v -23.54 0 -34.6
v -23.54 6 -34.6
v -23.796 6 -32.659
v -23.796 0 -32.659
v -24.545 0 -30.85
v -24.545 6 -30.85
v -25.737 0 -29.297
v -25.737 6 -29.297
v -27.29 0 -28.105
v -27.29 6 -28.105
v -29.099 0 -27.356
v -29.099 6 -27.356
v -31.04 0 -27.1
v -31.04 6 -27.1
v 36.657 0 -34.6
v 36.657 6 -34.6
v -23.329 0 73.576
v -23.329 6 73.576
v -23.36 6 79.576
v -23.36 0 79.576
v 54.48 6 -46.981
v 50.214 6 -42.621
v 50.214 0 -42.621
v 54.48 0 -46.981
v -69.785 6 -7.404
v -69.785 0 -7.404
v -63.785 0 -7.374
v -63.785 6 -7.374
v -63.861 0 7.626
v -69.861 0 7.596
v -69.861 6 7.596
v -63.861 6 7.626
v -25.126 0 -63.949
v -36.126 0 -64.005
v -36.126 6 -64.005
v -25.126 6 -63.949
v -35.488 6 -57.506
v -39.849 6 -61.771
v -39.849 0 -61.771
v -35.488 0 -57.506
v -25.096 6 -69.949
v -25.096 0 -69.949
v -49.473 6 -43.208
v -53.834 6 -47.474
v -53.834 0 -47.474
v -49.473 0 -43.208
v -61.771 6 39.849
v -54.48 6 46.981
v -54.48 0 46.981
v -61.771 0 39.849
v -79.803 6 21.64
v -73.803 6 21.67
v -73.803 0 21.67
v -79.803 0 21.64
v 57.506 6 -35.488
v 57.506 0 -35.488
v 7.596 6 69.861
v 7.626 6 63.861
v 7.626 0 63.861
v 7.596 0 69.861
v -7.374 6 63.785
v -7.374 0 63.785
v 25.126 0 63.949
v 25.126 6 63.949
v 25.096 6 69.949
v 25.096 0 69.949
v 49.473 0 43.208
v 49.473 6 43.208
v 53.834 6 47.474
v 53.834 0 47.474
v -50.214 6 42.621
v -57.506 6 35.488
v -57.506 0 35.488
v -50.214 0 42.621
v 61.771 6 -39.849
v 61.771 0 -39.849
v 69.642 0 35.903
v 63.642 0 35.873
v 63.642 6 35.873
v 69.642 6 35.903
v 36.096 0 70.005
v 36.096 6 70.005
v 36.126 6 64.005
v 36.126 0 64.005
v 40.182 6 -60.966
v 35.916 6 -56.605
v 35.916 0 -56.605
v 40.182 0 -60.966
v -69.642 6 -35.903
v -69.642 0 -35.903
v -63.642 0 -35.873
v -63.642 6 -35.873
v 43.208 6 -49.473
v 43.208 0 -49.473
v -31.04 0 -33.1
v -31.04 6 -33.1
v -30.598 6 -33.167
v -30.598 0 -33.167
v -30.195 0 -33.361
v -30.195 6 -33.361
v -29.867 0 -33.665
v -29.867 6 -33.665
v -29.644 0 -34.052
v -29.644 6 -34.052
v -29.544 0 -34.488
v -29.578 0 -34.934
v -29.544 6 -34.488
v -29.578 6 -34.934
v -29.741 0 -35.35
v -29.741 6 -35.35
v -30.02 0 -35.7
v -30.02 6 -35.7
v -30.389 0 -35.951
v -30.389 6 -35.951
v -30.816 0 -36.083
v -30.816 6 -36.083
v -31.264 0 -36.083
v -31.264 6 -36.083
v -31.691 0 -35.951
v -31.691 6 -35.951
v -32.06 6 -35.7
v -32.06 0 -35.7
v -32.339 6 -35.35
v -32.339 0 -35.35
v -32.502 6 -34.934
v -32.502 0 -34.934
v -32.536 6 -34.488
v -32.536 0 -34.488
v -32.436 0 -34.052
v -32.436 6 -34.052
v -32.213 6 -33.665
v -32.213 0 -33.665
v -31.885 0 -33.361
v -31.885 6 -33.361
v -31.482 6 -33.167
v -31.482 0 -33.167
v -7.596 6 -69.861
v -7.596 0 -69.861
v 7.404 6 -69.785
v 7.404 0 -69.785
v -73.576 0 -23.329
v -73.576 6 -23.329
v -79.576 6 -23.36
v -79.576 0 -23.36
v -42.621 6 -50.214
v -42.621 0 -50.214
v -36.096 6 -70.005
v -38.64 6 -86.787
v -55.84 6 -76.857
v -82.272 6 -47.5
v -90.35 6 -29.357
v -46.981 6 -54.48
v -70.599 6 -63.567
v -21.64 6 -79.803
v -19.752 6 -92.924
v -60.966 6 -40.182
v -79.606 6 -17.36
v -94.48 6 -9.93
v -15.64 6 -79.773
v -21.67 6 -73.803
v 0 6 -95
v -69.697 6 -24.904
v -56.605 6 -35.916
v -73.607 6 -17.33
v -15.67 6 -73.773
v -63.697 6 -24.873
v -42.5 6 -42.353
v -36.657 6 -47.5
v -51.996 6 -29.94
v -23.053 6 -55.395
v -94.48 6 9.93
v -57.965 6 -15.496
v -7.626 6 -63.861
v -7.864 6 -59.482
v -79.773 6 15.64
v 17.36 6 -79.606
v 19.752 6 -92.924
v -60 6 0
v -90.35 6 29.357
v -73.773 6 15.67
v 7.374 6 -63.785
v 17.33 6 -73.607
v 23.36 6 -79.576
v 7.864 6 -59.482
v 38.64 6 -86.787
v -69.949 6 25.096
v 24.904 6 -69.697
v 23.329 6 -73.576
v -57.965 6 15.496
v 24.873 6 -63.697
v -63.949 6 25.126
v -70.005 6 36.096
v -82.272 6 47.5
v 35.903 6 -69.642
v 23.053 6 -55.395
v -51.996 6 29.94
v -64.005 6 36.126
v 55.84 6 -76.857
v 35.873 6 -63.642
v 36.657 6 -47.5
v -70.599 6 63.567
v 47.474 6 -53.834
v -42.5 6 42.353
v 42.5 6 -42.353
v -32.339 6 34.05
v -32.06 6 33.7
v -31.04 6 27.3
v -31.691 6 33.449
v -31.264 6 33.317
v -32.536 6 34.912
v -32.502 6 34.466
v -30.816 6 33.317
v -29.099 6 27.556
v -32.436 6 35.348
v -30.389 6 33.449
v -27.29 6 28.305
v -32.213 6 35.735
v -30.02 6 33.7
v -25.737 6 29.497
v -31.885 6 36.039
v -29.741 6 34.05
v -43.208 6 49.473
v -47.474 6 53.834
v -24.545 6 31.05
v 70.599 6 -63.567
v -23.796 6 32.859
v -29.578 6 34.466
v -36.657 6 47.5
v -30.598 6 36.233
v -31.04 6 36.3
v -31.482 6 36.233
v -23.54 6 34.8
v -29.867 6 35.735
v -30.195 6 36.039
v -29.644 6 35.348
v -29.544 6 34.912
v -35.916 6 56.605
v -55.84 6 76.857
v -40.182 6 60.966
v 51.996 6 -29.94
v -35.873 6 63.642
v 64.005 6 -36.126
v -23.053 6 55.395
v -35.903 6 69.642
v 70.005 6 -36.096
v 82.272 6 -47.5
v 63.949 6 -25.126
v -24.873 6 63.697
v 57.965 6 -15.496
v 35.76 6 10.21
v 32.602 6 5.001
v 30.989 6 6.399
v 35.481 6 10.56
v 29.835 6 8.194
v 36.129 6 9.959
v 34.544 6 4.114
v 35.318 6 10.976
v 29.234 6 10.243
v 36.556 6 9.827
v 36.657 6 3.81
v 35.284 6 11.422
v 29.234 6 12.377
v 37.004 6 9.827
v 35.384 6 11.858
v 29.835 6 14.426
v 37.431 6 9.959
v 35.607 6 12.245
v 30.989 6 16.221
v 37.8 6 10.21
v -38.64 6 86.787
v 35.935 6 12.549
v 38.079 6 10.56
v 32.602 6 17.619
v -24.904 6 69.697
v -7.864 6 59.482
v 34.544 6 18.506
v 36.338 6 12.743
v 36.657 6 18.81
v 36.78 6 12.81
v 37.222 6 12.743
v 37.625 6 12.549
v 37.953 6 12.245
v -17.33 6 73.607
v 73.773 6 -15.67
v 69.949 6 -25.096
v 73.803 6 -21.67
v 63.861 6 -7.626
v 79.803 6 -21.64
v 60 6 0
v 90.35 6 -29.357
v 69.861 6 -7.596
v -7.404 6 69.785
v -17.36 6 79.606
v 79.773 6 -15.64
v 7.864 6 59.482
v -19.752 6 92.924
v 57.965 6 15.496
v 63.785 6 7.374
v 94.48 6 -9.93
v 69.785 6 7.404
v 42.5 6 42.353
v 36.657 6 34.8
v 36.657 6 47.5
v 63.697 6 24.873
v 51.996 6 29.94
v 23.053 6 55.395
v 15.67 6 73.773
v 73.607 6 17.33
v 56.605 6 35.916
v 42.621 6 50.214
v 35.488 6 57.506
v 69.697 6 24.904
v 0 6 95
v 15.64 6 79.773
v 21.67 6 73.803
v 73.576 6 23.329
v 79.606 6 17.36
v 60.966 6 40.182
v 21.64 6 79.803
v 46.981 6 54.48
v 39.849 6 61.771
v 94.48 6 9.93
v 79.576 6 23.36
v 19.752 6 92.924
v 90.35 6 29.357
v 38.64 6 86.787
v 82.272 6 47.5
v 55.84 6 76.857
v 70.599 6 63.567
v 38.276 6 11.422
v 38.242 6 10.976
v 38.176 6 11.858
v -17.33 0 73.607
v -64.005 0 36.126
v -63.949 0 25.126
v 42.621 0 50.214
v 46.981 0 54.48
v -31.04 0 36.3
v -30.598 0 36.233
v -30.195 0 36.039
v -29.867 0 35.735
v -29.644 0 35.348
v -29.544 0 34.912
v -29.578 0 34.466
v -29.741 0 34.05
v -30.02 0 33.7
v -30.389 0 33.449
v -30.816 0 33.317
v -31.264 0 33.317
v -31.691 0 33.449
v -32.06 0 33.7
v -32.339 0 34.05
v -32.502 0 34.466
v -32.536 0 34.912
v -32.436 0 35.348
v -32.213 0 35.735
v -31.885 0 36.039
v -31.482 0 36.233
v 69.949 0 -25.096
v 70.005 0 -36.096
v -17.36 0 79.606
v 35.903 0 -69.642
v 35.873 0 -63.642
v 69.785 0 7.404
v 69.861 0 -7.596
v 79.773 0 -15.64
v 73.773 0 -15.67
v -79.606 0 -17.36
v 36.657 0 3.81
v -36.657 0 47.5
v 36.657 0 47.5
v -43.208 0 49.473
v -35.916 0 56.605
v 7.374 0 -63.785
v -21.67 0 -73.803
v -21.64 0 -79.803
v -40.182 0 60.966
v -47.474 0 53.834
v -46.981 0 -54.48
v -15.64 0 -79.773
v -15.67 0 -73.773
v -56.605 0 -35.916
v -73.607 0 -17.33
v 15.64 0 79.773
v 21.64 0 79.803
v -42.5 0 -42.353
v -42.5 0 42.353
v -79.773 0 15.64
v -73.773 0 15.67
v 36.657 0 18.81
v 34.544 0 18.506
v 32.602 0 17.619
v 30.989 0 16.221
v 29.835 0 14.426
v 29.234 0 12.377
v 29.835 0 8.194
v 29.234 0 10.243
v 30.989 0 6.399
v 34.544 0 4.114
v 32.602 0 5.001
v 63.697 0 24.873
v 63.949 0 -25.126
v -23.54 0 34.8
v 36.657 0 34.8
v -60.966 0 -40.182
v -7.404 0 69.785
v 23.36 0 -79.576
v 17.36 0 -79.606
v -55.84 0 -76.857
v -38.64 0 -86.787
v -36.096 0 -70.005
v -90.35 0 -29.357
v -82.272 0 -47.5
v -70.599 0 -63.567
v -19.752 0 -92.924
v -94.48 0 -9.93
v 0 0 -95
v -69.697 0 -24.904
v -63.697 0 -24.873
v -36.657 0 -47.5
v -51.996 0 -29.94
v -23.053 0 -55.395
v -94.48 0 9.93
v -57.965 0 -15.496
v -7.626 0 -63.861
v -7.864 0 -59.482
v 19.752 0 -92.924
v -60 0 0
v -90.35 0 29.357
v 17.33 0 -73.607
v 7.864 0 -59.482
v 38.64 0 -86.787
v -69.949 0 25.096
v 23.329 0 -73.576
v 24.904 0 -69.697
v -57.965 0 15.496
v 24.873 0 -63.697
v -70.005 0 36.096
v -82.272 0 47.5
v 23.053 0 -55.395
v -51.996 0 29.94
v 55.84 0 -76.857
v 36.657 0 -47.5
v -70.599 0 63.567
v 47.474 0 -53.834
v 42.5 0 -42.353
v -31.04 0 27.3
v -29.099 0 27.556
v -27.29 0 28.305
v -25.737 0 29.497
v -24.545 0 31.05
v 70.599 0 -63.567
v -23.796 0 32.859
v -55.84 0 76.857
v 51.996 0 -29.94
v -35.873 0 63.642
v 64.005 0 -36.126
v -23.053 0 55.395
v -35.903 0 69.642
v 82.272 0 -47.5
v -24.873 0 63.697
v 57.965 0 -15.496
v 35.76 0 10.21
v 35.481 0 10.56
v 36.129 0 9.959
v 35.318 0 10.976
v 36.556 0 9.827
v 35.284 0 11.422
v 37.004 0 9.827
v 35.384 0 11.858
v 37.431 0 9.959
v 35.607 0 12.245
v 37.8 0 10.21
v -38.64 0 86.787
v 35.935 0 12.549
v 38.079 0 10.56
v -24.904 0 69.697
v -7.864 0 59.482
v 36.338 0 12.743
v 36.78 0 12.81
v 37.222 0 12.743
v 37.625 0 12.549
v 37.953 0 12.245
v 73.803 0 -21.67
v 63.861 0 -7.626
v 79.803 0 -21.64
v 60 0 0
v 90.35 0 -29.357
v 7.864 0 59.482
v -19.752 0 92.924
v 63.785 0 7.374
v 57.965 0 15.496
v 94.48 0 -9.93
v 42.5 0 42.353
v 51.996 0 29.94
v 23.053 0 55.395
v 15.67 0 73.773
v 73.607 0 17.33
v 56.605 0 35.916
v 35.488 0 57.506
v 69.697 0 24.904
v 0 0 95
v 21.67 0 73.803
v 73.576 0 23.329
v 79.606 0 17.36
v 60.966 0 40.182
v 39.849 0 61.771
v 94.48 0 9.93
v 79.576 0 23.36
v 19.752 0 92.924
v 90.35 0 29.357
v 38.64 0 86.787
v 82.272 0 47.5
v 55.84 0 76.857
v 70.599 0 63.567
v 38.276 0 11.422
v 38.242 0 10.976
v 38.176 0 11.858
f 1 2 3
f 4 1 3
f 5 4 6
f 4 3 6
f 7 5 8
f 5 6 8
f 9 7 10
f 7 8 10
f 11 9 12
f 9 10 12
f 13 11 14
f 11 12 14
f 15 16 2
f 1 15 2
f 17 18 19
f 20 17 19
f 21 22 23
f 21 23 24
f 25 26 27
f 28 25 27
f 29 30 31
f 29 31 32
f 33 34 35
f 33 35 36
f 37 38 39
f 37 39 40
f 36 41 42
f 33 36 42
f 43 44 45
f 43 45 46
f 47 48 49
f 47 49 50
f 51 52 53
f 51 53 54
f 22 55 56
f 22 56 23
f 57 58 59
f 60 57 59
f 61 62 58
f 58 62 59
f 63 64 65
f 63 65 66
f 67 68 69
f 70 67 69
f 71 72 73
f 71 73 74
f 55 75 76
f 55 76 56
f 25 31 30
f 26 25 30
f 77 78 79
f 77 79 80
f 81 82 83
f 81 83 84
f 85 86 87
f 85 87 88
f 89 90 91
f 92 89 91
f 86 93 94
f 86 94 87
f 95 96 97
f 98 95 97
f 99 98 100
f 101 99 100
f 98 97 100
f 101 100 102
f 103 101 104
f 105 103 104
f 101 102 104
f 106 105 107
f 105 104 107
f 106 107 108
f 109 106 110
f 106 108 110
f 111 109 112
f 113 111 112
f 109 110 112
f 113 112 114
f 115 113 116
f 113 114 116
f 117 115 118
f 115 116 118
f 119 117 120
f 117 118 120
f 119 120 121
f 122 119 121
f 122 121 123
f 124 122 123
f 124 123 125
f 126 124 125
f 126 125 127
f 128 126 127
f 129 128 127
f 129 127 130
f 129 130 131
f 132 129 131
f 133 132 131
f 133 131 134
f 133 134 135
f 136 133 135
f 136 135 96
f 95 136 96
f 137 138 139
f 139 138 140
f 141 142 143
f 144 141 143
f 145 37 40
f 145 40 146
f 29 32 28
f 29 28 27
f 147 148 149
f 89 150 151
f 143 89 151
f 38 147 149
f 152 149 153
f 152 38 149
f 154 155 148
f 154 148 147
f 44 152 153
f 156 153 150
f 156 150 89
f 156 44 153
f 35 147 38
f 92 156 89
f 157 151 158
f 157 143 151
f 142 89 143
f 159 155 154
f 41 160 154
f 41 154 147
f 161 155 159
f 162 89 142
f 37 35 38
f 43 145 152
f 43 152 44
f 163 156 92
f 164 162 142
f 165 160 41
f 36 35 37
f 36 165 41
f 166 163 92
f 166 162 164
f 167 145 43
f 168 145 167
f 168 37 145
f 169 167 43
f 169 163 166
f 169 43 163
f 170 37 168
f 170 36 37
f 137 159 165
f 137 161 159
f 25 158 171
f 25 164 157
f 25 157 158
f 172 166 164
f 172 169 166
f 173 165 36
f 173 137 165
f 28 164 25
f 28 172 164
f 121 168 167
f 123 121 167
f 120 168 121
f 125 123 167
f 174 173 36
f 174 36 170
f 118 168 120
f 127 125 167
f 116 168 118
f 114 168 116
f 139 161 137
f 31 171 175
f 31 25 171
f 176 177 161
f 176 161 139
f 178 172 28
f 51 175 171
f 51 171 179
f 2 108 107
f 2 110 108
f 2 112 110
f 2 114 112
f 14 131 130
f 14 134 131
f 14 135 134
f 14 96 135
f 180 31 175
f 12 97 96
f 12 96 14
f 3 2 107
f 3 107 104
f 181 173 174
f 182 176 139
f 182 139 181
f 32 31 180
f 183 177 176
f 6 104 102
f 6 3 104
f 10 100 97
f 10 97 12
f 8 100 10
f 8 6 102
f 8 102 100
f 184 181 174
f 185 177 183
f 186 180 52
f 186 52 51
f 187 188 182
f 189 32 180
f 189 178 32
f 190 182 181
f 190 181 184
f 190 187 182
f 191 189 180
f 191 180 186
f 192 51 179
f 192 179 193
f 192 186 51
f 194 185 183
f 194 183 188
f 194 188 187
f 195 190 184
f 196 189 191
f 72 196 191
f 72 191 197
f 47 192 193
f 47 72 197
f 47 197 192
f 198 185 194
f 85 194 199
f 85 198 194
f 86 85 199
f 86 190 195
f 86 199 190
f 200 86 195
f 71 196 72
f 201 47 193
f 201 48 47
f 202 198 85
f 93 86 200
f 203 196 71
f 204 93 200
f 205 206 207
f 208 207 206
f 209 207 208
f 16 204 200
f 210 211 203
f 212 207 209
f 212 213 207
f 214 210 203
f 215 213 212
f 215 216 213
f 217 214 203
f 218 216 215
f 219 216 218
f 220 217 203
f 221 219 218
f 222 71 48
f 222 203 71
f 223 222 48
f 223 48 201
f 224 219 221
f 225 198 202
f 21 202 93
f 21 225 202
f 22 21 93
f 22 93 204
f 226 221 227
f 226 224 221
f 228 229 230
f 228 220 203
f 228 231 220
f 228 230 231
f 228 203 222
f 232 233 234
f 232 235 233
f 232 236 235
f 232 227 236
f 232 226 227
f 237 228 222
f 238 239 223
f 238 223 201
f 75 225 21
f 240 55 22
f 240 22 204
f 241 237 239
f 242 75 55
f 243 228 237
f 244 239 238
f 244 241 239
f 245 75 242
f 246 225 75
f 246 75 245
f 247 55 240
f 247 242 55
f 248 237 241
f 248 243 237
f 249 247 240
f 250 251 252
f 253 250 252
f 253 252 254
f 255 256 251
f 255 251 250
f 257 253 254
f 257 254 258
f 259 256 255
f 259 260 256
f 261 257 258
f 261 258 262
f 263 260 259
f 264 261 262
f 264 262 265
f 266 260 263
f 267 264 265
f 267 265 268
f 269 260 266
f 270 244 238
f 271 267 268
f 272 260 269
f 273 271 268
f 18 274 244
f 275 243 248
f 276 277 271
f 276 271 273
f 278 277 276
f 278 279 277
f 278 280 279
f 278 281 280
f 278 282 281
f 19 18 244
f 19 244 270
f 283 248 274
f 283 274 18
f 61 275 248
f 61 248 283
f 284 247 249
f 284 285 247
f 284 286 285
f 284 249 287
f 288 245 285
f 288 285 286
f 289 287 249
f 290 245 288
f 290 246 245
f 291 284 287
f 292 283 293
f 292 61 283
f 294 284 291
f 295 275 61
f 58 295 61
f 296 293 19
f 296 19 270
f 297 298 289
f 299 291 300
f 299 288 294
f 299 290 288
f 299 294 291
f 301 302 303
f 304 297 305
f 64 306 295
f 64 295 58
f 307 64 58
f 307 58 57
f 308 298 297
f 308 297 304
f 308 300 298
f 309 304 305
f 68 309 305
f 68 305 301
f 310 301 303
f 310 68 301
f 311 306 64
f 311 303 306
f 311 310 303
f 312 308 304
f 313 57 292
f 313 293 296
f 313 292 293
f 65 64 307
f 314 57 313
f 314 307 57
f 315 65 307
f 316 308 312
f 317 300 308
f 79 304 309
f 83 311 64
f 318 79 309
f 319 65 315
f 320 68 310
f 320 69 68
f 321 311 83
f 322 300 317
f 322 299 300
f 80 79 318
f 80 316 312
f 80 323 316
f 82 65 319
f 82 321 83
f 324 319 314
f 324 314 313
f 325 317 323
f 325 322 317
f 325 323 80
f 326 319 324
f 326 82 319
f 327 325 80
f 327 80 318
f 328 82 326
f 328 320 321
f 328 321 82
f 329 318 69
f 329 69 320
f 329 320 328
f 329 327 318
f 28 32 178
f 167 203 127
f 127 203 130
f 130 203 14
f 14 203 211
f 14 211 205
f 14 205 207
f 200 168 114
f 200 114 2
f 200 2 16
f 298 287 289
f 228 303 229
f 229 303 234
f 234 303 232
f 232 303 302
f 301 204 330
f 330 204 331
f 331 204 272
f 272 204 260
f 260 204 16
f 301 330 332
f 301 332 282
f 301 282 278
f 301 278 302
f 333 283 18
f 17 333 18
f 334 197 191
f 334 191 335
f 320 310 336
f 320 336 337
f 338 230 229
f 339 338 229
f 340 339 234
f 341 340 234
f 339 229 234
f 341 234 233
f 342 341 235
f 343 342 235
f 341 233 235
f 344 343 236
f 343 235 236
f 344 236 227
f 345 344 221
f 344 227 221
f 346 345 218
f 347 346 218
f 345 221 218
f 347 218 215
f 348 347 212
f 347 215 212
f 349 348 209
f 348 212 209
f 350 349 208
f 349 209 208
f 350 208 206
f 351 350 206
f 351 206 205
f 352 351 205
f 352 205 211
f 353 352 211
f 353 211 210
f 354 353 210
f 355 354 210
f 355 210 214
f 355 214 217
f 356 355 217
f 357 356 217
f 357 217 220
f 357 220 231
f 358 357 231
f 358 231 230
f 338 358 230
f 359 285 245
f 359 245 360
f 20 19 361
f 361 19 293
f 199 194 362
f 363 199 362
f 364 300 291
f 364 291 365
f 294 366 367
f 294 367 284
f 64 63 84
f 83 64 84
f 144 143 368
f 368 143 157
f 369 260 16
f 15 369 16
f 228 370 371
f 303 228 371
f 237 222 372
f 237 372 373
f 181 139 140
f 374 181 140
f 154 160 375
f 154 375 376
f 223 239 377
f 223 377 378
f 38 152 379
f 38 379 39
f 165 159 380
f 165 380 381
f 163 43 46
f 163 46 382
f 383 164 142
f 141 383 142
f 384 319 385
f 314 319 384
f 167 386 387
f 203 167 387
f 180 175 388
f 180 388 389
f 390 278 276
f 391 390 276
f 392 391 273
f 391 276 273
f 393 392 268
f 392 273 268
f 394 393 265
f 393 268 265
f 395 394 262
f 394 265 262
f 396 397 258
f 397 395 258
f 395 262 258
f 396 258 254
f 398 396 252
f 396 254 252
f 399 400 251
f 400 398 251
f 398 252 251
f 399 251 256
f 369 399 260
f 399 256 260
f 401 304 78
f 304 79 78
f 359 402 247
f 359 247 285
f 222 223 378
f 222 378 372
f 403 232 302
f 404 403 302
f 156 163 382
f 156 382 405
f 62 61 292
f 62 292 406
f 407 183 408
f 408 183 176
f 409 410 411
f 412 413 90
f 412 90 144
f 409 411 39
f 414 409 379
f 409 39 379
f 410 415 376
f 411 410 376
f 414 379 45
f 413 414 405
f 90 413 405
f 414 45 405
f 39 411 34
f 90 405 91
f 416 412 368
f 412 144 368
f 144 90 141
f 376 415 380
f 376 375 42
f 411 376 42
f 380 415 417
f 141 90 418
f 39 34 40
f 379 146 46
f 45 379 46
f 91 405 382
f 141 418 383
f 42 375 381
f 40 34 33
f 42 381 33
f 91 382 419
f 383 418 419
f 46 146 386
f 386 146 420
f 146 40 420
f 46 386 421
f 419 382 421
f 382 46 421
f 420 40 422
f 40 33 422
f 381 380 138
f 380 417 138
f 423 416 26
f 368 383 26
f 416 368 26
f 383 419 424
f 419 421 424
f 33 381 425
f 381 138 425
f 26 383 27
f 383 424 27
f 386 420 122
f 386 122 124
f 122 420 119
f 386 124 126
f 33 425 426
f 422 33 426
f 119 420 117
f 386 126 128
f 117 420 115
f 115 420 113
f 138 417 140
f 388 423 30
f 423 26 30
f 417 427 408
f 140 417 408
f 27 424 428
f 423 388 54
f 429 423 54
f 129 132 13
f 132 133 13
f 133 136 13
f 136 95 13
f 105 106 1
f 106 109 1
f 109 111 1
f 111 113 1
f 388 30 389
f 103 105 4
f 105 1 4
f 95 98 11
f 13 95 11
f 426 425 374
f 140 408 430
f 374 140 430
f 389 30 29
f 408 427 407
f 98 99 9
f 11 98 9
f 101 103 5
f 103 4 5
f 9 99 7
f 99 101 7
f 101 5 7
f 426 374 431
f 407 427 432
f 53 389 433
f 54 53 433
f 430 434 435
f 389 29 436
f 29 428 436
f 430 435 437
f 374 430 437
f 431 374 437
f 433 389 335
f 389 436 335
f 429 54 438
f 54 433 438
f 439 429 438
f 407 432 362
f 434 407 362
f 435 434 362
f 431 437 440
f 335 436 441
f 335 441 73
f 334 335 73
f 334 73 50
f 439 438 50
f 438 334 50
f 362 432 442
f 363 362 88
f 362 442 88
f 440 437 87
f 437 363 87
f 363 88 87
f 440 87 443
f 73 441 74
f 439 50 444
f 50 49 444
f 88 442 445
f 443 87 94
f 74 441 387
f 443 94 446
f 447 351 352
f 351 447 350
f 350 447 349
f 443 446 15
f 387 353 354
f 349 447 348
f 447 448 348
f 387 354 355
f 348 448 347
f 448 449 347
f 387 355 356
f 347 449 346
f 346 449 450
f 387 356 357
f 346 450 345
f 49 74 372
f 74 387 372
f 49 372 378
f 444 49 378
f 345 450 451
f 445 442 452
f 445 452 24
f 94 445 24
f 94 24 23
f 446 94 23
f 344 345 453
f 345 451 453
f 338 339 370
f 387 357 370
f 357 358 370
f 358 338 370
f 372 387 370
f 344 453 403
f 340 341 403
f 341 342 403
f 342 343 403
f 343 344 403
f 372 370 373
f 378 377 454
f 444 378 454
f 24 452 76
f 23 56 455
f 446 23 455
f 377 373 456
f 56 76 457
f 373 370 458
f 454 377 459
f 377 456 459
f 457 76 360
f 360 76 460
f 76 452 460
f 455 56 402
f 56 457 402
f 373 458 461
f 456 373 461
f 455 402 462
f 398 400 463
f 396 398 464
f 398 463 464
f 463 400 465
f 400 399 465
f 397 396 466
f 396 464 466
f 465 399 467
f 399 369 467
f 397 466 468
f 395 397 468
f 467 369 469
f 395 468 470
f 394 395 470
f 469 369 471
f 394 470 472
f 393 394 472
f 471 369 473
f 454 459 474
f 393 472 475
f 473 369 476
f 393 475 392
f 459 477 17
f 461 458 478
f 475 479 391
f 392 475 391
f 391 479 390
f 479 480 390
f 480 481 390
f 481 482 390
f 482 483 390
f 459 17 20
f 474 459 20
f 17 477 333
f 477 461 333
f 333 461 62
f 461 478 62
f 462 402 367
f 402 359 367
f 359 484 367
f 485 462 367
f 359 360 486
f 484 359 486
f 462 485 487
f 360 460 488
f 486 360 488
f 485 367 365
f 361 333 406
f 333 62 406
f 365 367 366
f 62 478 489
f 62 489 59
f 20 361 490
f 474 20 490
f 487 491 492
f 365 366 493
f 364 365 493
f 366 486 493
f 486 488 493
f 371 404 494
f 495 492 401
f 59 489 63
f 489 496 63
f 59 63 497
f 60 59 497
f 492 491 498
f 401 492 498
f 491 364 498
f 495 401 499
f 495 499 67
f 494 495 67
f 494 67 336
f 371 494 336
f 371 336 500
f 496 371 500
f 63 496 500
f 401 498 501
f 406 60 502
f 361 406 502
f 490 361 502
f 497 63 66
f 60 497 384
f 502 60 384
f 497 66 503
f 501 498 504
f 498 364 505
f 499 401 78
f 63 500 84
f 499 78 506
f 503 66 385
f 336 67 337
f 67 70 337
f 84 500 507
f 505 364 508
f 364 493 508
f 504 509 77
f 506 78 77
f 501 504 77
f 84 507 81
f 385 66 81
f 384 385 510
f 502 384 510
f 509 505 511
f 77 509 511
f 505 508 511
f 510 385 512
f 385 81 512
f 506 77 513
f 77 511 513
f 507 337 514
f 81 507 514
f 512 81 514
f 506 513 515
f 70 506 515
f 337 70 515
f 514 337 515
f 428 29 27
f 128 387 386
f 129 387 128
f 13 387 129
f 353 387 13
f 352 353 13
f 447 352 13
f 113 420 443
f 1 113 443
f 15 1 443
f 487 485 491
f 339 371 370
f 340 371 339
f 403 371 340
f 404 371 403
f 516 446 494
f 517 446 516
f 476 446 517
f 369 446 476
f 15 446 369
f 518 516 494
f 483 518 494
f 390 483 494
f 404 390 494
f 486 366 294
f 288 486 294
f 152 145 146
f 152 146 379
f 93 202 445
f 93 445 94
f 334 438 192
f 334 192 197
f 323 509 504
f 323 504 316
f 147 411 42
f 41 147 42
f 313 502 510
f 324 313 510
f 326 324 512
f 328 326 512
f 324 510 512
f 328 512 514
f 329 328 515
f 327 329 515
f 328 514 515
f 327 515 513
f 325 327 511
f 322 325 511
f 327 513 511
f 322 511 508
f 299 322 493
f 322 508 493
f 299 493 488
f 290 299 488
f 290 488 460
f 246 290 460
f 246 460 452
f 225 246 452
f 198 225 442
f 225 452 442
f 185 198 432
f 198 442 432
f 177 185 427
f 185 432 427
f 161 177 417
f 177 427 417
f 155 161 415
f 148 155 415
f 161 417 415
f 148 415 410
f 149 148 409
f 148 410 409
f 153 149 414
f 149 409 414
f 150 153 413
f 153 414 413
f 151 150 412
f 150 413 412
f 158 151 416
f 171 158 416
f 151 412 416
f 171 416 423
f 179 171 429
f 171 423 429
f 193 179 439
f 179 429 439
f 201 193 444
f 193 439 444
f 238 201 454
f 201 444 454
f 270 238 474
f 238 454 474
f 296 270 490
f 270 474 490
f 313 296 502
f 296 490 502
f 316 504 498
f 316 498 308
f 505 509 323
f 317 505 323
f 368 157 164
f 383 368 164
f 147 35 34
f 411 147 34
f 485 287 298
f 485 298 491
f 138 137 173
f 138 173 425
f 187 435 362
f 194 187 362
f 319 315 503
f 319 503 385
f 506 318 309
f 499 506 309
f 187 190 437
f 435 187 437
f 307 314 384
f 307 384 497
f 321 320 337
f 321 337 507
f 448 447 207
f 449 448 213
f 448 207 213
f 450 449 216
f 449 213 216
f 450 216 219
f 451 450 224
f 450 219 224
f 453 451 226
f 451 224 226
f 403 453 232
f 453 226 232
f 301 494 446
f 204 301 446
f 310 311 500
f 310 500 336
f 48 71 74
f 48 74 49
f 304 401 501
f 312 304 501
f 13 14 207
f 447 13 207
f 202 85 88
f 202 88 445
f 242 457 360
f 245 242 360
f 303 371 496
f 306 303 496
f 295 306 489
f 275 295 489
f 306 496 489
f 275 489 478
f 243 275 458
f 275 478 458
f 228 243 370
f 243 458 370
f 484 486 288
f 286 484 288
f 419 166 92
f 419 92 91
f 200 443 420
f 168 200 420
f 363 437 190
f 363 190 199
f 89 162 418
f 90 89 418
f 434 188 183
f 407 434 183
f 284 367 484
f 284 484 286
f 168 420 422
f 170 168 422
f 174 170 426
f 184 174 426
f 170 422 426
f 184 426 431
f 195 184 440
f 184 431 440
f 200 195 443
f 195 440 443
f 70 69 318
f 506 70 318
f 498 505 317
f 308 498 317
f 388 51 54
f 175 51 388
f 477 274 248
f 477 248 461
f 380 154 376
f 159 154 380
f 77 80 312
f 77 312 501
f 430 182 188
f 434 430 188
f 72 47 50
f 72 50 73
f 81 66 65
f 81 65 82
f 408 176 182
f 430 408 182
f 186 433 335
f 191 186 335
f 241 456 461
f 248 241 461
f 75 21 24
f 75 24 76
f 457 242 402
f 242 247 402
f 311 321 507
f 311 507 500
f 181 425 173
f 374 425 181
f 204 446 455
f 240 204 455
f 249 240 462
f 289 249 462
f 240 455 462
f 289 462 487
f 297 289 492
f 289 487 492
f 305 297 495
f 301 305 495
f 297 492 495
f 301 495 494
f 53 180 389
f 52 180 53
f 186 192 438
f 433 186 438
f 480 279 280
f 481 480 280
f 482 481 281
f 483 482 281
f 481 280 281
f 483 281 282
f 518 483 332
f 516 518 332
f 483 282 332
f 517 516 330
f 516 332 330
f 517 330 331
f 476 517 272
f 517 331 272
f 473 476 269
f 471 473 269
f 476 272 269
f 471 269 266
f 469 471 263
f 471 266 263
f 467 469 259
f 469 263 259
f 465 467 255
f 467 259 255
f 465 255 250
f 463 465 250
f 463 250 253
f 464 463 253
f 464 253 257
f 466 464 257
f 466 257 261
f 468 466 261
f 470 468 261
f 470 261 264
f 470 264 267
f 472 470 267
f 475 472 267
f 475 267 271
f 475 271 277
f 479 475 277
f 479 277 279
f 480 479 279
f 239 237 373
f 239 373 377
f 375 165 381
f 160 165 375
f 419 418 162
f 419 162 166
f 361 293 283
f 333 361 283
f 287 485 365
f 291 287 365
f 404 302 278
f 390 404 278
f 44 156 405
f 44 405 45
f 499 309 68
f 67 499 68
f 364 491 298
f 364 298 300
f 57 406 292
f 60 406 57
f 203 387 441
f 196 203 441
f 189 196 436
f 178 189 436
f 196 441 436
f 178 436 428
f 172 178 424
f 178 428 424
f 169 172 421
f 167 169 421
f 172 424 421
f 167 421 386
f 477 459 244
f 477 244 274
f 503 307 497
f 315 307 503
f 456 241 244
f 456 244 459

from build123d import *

# Parameters (mm, degrees)
SKETCH1_R             = 95
BOSS_EXTRUDE1_DEPTH   = 6
SKETCH2_W             = 55
SKETCH2_H             = 30
CUT_EXTRUDE1_DEPTH    = 135.484199815
CAVITY1_START         = -69.821849164
CAVITY1_OUTLINE_W     = 15
CAVITY1_OUTLINE_H     = 6
CAVITY1_OUTLINE_W_2   = 11
CAVITY1_DEPTH         = 6
CAVITY1_START_2       = 63.821772898
CAVITY1_2_OUTLINE_W   = 11
CAVITY1_2_OUTLINE_H   = 6
CAVITY1_2_OUTLINE_W_2 = 15
CAVITY1_2_DEPTH       = 6
CAVITY1_START_3       = -7.051829773
CAVITY1_3_OUTLINE_W   = 6
CAVITY1_3_OUTLINE_H   = 6
CAVITY1_3_DEPTH       = 14.103659546
CAVITY1_START_4       = -35.551829773
CAVITY1_4_OUTLINE_W   = 6
CAVITY1_4_OUTLINE_H   = 6
CAVITY1_4_DEPTH       = 10.103659546
CAVITY1_START_5       = 25.448170227
CAVITY1_5_OUTLINE_W   = 6
CAVITY1_5_OUTLINE_H   = 6
CAVITY1_5_DEPTH       = 10.103659546
CAVITY1_START_6       = -36.448170227
CAVITY1_6_OUTLINE_W   = 6
CAVITY1_6_OUTLINE_H   = 6
CAVITY1_6_DEPTH       = 0.896340454
CAVITY1_START_7       = -25.448170227
CAVITY1_7_OUTLINE_W   = 6
CAVITY1_7_OUTLINE_H   = 6
CAVITY1_7_DEPTH       = 0.896340454
CAVITY1_START_8       = -7.948170227
CAVITY1_8_OUTLINE_W   = 6
CAVITY1_8_OUTLINE_H   = 6
CAVITY1_8_DEPTH       = 0.896340454
CAVITY1_START_9       = 7.051829773
CAVITY1_9_OUTLINE_W   = 6
CAVITY1_9_OUTLINE_H   = 6
CAVITY1_9_DEPTH       = 0.896340454
CAVITY1_START_10      = 24.551829773
CAVITY1_10_OUTLINE_W  = 6
CAVITY1_10_OUTLINE_H  = 6
CAVITY1_10_DEPTH      = 0.896340454
CAVITY1_START_11      = 35.551829773
CAVITY1_11_OUTLINE_W  = 6
CAVITY1_11_OUTLINE_H  = 6
CAVITY1_11_DEPTH      = 0.896340454
SKETCH3_R             = 1.5
CUT_EXTRUDE3_DEPTH    = 10
CUT_EXTRUDE4_DEPTH    = 135.484199815
CAVITY2_START         = 73.692998072
CAVITY2_OUTLINE_W     = 6
CAVITY2_OUTLINE_H     = 6
CAVITY2_DEPTH         = 6
CUT_EXTRUDE5_DEPTH    = 135.484199815


# Read off the part's stored shape, not the designer's step: Cavity1, Cavity2
with BuildPart() as part:
    # Sketch1 → Boss-Extrude1 (new body)
    with BuildSketch(Plane(origin=(0, 0, 0), x_dir=(1, 0, 0), z_dir=(0, 1, 0))):
        with Locations(Location((0, 0, 0), (0, 0, 270))):
            Circle(SKETCH1_R)
        with BuildLine():
            Line((-36.657195747, -47.5), (36.657195747, -47.5))
            ThreePointArc((36.657195747, -47.5), (0, -60), (-36.657195747, -47.5))
        make_face(mode=Mode.SUBTRACT)
        with BuildLine():
            Line((-42.5, 42.352685865), (-42.5, -42.352685865))
            ThreePointArc((-42.5, -42.352685865), (-60, 0), (-42.5, 42.352685865))
        make_face(mode=Mode.SUBTRACT)
        with BuildLine():
            Line((36.657195747, 47.5), (-36.657195747, 47.5))
            ThreePointArc((-36.657195747, 47.5), (0, 60), (36.657195747, 47.5))
        make_face(mode=Mode.SUBTRACT)
        with BuildLine():
            Line((42.5, -42.352685865), (42.5, 42.352685865))
            ThreePointArc((42.5, 42.352685865), (60, 0), (42.5, -42.352685865))
        make_face(mode=Mode.SUBTRACT)
    extrude(amount=BOSS_EXTRUDE1_DEPTH)

    # Sketch2 → Cut-Extrude1 (cut, through all)
    with BuildSketch(Plane(origin=(0, 6, 0), x_dir=(1, 0, 0), z_dir=(0, 1, 0))):
        Rectangle(SKETCH2_W, SKETCH2_H)
    extrude(amount=-CUT_EXTRUDE1_DEPTH, mode=Mode.SUBTRACT)

    # Cavity1 outline → Cavity1 (cut)
    with BuildSketch(Plane(origin=(0, 0, 0), x_dir=(0.9999872892756082, 0, 0.005041952719030872), z_dir=(0.005041952719030872, 0, -0.9999872892756083)).offset(CAVITY1_START)):
        with Locations((0.448170227, -3)):
            Rectangle(CAVITY1_OUTLINE_W, CAVITY1_OUTLINE_H)
        with Locations((30.948170227, -3)):
            Rectangle(CAVITY1_OUTLINE_W_2, CAVITY1_OUTLINE_H)
        with Locations((-30.051829773, -3)):
            Rectangle(CAVITY1_OUTLINE_W_2, CAVITY1_OUTLINE_H)
    extrude(amount=CAVITY1_DEPTH, mode=Mode.SUBTRACT)

    # Cavity1 2 outline → Cavity1 2 (cut)
    with BuildSketch(Plane(origin=(0, 0, 0), x_dir=(0.9999872892756082, 0, 0.005041952719030872), z_dir=(0.005041952719030872, 0, -0.9999872892756083)).offset(CAVITY1_START_2)):
        with Locations((30.051829773, -3)):
            Rectangle(CAVITY1_2_OUTLINE_W, CAVITY1_2_OUTLINE_H)
        with Locations((-0.448170227, -3)):
            Rectangle(CAVITY1_2_OUTLINE_W_2, CAVITY1_2_OUTLINE_H)
        with Locations((-30.948170227, -3)):
            Rectangle(CAVITY1_2_OUTLINE_W, CAVITY1_2_OUTLINE_H)
    extrude(amount=CAVITY1_2_DEPTH, mode=Mode.SUBTRACT)

    # Cavity1 3 outline → Cavity1 3 (cut)
    with BuildSketch(Plane(origin=(0, 0, 0), x_dir=(0.9999872892756082, 0, 0.005041952719030872), z_dir=(0.005041952719030872, 0, -0.9999872892756083)).offset(CAVITY1_START_3)):
        with Locations((66.821849164, -3)):
            Rectangle(CAVITY1_3_OUTLINE_W, CAVITY1_3_OUTLINE_H)
        with Locations((-66.821849164, -3)):
            Rectangle(CAVITY1_3_OUTLINE_W, CAVITY1_3_OUTLINE_H)
    extrude(amount=CAVITY1_3_DEPTH, mode=Mode.SUBTRACT)

    # Cavity1 4 outline → Cavity1 4 (cut)
    with BuildSketch(Plane(origin=(0, 0, 0), x_dir=(0.9999872892756082, 0, 0.005041952719030872), z_dir=(0.005041952719030872, 0, -0.9999872892756083)).offset(CAVITY1_START_4)):
        with Locations((66.821849164, -3)):
            Rectangle(CAVITY1_4_OUTLINE_W, CAVITY1_4_OUTLINE_H)
        with Locations((-66.821849164, -3)):
            Rectangle(CAVITY1_4_OUTLINE_W, CAVITY1_4_OUTLINE_H)
    extrude(amount=CAVITY1_4_DEPTH, mode=Mode.SUBTRACT)

    # Cavity1 5 outline → Cavity1 5 (cut)
    with BuildSketch(Plane(origin=(0, 0, 0), x_dir=(0.9999872892756082, 0, 0.005041952719030872), z_dir=(0.005041952719030872, 0, -0.9999872892756083)).offset(CAVITY1_START_5)):
        with Locations((66.821849164, -3)):
            Rectangle(CAVITY1_5_OUTLINE_W, CAVITY1_5_OUTLINE_H)
        with Locations((-66.821849164, -3)):
            Rectangle(CAVITY1_5_OUTLINE_W, CAVITY1_5_OUTLINE_H)
    extrude(amount=CAVITY1_5_DEPTH, mode=Mode.SUBTRACT)

    # Cavity1 6 outline → Cavity1 6 (cut)
    with BuildSketch(Plane(origin=(0, 0, 0), x_dir=(0.9999872892756082, 0, 0.005041952719030872), z_dir=(0.005041952719030872, 0, -0.9999872892756083)).offset(CAVITY1_START_6)):
        with Locations((-66.821849164, -3)):
            Rectangle(CAVITY1_6_OUTLINE_W, CAVITY1_6_OUTLINE_H)
    extrude(amount=CAVITY1_6_DEPTH, mode=Mode.SUBTRACT)

    # Cavity1 7 outline → Cavity1 7 (cut)
    with BuildSketch(Plane(origin=(0, 0, 0), x_dir=(0.9999872892756082, 0, 0.005041952719030872), z_dir=(0.005041952719030872, 0, -0.9999872892756083)).offset(CAVITY1_START_7)):
        with Locations((66.821849164, -3)):
            Rectangle(CAVITY1_7_OUTLINE_W, CAVITY1_7_OUTLINE_H)
    extrude(amount=CAVITY1_7_DEPTH, mode=Mode.SUBTRACT)

    # Cavity1 8 outline → Cavity1 8 (cut)
    with BuildSketch(Plane(origin=(0, 0, 0), x_dir=(0.9999872892756082, 0, 0.005041952719030872), z_dir=(0.005041952719030872, 0, -0.9999872892756083)).offset(CAVITY1_START_8)):
        with Locations((-66.821849164, -3)):
            Rectangle(CAVITY1_8_OUTLINE_W, CAVITY1_8_OUTLINE_H)
    extrude(amount=CAVITY1_8_DEPTH, mode=Mode.SUBTRACT)

    # Cavity1 9 outline → Cavity1 9 (cut)
    with BuildSketch(Plane(origin=(0, 0, 0), x_dir=(0.9999872892756082, 0, 0.005041952719030872), z_dir=(0.005041952719030872, 0, -0.9999872892756083)).offset(CAVITY1_START_9)):
        with Locations((66.821849164, -3)):
            Rectangle(CAVITY1_9_OUTLINE_W, CAVITY1_9_OUTLINE_H)
    extrude(amount=CAVITY1_9_DEPTH, mode=Mode.SUBTRACT)

    # Cavity1 10 outline → Cavity1 10 (cut)
    with BuildSketch(Plane(origin=(0, 0, 0), x_dir=(0.9999872892756082, 0, 0.005041952719030872), z_dir=(0.005041952719030872, 0, -0.9999872892756083)).offset(CAVITY1_START_10)):
        with Locations((-66.821849164, -3)):
            Rectangle(CAVITY1_10_OUTLINE_W, CAVITY1_10_OUTLINE_H)
    extrude(amount=CAVITY1_10_DEPTH, mode=Mode.SUBTRACT)

    # Cavity1 11 outline → Cavity1 11 (cut)
    with BuildSketch(Plane(origin=(0, 0, 0), x_dir=(0.9999872892756082, 0, 0.005041952719030872), z_dir=(0.005041952719030872, 0, -0.9999872892756083)).offset(CAVITY1_START_11)):
        with Locations((66.821849164, -3)):
            Rectangle(CAVITY1_11_OUTLINE_W, CAVITY1_11_OUTLINE_H)
    extrude(amount=CAVITY1_11_DEPTH, mode=Mode.SUBTRACT)

    # Sketch3 → Cut-Extrude3 (cut)
    with BuildSketch(Plane(origin=(0, 6, 0), x_dir=(1, 0, 0), z_dir=(0, 1, 0))):
        with Locations(Location((-31.04, -34.8, 0), (0, 0, 270))):
            Circle(SKETCH3_R)
        with Locations(Location((-31.04, 34.6, 0), (0, 0, 270))):
            Circle(SKETCH3_R)
        with Locations(Location((36.78, -11.31, 0), (0, 0, 270))):
            Circle(SKETCH3_R)
        with BuildLine():
            ThreePointArc((36.657195747, -18.81), (29.157195747, -11.31), (36.657195747, -3.81))
            Line((36.657195747, -3.81), (36.657195747, 34.6))
            Line((36.657195747, 34.6), (-23.54, 34.6))
            ThreePointArc((-23.54, 34.6), (-25.736699141, 29.296699141), (-31.04, 27.1))
            Line((-31.04, 27.1), (-31.04, -27.3))
            ThreePointArc((-31.04, -27.3), (-25.736699141, -29.496699141), (-23.54, -34.8))
            Line((-23.54, -34.8), (36.657195747, -34.8))
            Line((36.657195747, -34.8), (36.657195747, -18.81))
        make_face()
    extrude(amount=-CUT_EXTRUDE3_DEPTH, mode=Mode.SUBTRACT)

    # Sketch4 → Cut-Extrude4 (cut, through all)
    with BuildSketch(Plane(origin=(0, 6, 0), x_dir=(1, 0, 0), z_dir=(0, 1, 0))):
        Polygon((39.849101937, -61.771443224), (35.488287493, -57.506083054), (42.620529088, -50.214229392), (46.981343533, -54.479589562), align=None)
        Polygon((53.83388938, -47.473690947), (60.966130976, -40.181837285), (56.605316531, -35.916477115), (49.473074935, -43.208330777), align=None)
        Polygon((-61.771443224, -39.849101937), (-57.506083054, -35.488287493), (-50.214229392, -42.620529088), (-54.479589562, -46.981343533), align=None)
        Polygon((-47.473690947, -53.83388938), (-43.208330777, -49.473074935), (-35.916477115, -56.605316531), (-40.181837285, -60.966130976), align=None)
        Polygon((-39.849101937, 61.771443224), (-35.488287493, 57.506083054), (-42.620529088, 50.214229392), (-46.981343533, 54.479589562), align=None)
        Polygon((-53.83388938, 47.473690947), (-49.473074935, 43.208330777), (-56.605316531, 35.916477115), (-60.966130976, 40.181837285), align=None)
        Polygon((61.771443224, 39.849101937), (57.506083054, 35.488287493), (50.214229392, 42.620529088), (54.479589562, 46.981343533), align=None)
        Polygon((47.473690947, 53.83388938), (43.208330777, 49.473074935), (35.916477115, 56.605316531), (40.181837285, 60.966130976), align=None)
    extrude(amount=-CUT_EXTRUDE4_DEPTH, mode=Mode.SUBTRACT)

    # Cavity2 outline → Cavity2 (cut)
    with BuildSketch(Plane(origin=(0, 0, 0), x_dir=(0, 1, 0), z_dir=(0.9999872892756082, 0, 0.005041952719040901)).offset(CAVITY2_START)):
        with Locations((3, -19.041827)):
            Rectangle(CAVITY2_OUTLINE_W, CAVITY2_OUTLINE_H)
        with Locations((3, 19.958173)):
            Rectangle(CAVITY2_OUTLINE_W, CAVITY2_OUTLINE_H)
    extrude(amount=CAVITY2_DEPTH, mode=Mode.SUBTRACT)

    # Sketch5 → Cut-Extrude5 (cut, through all)
    with BuildSketch(Plane(origin=(0, 6, 0), x_dir=(1, 0, 0), z_dir=(0, 1, 0))):
        Polygon((15.670066484, -73.772943514), (21.66999022, -73.80319523), (21.639738504, -79.803118966), (15.639814768, -79.77286725), align=None)
        Polygon((-23.329437797, -73.576307358), (-23.359689514, -79.576231094), (-17.359765778, -79.60648281), (-17.329514062, -73.606559074), align=None)
        Polygon((-73.772943514, -15.670066484), (-73.80319523, -21.66999022), (-79.803118966, -21.639738504), (-79.77286725, -15.639814768), align=None)
        Polygon((-73.576307358, 23.329437797), (-79.576231094, 23.359689514), (-79.60648281, 17.359765778), (-73.606559074, 17.329514062), align=None)
        Polygon((-15.670066484, 73.772943514), (-21.66999022, 73.80319523), (-21.639738504, 79.803118966), (-15.639814768, 79.77286725), align=None)
        Polygon((23.329437797, 73.576307358), (23.359689514, 79.576231094), (17.359765778, 79.60648281), (17.329514062, 73.606559074), align=None)
    extrude(amount=-CUT_EXTRUDE5_DEPTH, mode=Mode.SUBTRACT)


solid = part.part
